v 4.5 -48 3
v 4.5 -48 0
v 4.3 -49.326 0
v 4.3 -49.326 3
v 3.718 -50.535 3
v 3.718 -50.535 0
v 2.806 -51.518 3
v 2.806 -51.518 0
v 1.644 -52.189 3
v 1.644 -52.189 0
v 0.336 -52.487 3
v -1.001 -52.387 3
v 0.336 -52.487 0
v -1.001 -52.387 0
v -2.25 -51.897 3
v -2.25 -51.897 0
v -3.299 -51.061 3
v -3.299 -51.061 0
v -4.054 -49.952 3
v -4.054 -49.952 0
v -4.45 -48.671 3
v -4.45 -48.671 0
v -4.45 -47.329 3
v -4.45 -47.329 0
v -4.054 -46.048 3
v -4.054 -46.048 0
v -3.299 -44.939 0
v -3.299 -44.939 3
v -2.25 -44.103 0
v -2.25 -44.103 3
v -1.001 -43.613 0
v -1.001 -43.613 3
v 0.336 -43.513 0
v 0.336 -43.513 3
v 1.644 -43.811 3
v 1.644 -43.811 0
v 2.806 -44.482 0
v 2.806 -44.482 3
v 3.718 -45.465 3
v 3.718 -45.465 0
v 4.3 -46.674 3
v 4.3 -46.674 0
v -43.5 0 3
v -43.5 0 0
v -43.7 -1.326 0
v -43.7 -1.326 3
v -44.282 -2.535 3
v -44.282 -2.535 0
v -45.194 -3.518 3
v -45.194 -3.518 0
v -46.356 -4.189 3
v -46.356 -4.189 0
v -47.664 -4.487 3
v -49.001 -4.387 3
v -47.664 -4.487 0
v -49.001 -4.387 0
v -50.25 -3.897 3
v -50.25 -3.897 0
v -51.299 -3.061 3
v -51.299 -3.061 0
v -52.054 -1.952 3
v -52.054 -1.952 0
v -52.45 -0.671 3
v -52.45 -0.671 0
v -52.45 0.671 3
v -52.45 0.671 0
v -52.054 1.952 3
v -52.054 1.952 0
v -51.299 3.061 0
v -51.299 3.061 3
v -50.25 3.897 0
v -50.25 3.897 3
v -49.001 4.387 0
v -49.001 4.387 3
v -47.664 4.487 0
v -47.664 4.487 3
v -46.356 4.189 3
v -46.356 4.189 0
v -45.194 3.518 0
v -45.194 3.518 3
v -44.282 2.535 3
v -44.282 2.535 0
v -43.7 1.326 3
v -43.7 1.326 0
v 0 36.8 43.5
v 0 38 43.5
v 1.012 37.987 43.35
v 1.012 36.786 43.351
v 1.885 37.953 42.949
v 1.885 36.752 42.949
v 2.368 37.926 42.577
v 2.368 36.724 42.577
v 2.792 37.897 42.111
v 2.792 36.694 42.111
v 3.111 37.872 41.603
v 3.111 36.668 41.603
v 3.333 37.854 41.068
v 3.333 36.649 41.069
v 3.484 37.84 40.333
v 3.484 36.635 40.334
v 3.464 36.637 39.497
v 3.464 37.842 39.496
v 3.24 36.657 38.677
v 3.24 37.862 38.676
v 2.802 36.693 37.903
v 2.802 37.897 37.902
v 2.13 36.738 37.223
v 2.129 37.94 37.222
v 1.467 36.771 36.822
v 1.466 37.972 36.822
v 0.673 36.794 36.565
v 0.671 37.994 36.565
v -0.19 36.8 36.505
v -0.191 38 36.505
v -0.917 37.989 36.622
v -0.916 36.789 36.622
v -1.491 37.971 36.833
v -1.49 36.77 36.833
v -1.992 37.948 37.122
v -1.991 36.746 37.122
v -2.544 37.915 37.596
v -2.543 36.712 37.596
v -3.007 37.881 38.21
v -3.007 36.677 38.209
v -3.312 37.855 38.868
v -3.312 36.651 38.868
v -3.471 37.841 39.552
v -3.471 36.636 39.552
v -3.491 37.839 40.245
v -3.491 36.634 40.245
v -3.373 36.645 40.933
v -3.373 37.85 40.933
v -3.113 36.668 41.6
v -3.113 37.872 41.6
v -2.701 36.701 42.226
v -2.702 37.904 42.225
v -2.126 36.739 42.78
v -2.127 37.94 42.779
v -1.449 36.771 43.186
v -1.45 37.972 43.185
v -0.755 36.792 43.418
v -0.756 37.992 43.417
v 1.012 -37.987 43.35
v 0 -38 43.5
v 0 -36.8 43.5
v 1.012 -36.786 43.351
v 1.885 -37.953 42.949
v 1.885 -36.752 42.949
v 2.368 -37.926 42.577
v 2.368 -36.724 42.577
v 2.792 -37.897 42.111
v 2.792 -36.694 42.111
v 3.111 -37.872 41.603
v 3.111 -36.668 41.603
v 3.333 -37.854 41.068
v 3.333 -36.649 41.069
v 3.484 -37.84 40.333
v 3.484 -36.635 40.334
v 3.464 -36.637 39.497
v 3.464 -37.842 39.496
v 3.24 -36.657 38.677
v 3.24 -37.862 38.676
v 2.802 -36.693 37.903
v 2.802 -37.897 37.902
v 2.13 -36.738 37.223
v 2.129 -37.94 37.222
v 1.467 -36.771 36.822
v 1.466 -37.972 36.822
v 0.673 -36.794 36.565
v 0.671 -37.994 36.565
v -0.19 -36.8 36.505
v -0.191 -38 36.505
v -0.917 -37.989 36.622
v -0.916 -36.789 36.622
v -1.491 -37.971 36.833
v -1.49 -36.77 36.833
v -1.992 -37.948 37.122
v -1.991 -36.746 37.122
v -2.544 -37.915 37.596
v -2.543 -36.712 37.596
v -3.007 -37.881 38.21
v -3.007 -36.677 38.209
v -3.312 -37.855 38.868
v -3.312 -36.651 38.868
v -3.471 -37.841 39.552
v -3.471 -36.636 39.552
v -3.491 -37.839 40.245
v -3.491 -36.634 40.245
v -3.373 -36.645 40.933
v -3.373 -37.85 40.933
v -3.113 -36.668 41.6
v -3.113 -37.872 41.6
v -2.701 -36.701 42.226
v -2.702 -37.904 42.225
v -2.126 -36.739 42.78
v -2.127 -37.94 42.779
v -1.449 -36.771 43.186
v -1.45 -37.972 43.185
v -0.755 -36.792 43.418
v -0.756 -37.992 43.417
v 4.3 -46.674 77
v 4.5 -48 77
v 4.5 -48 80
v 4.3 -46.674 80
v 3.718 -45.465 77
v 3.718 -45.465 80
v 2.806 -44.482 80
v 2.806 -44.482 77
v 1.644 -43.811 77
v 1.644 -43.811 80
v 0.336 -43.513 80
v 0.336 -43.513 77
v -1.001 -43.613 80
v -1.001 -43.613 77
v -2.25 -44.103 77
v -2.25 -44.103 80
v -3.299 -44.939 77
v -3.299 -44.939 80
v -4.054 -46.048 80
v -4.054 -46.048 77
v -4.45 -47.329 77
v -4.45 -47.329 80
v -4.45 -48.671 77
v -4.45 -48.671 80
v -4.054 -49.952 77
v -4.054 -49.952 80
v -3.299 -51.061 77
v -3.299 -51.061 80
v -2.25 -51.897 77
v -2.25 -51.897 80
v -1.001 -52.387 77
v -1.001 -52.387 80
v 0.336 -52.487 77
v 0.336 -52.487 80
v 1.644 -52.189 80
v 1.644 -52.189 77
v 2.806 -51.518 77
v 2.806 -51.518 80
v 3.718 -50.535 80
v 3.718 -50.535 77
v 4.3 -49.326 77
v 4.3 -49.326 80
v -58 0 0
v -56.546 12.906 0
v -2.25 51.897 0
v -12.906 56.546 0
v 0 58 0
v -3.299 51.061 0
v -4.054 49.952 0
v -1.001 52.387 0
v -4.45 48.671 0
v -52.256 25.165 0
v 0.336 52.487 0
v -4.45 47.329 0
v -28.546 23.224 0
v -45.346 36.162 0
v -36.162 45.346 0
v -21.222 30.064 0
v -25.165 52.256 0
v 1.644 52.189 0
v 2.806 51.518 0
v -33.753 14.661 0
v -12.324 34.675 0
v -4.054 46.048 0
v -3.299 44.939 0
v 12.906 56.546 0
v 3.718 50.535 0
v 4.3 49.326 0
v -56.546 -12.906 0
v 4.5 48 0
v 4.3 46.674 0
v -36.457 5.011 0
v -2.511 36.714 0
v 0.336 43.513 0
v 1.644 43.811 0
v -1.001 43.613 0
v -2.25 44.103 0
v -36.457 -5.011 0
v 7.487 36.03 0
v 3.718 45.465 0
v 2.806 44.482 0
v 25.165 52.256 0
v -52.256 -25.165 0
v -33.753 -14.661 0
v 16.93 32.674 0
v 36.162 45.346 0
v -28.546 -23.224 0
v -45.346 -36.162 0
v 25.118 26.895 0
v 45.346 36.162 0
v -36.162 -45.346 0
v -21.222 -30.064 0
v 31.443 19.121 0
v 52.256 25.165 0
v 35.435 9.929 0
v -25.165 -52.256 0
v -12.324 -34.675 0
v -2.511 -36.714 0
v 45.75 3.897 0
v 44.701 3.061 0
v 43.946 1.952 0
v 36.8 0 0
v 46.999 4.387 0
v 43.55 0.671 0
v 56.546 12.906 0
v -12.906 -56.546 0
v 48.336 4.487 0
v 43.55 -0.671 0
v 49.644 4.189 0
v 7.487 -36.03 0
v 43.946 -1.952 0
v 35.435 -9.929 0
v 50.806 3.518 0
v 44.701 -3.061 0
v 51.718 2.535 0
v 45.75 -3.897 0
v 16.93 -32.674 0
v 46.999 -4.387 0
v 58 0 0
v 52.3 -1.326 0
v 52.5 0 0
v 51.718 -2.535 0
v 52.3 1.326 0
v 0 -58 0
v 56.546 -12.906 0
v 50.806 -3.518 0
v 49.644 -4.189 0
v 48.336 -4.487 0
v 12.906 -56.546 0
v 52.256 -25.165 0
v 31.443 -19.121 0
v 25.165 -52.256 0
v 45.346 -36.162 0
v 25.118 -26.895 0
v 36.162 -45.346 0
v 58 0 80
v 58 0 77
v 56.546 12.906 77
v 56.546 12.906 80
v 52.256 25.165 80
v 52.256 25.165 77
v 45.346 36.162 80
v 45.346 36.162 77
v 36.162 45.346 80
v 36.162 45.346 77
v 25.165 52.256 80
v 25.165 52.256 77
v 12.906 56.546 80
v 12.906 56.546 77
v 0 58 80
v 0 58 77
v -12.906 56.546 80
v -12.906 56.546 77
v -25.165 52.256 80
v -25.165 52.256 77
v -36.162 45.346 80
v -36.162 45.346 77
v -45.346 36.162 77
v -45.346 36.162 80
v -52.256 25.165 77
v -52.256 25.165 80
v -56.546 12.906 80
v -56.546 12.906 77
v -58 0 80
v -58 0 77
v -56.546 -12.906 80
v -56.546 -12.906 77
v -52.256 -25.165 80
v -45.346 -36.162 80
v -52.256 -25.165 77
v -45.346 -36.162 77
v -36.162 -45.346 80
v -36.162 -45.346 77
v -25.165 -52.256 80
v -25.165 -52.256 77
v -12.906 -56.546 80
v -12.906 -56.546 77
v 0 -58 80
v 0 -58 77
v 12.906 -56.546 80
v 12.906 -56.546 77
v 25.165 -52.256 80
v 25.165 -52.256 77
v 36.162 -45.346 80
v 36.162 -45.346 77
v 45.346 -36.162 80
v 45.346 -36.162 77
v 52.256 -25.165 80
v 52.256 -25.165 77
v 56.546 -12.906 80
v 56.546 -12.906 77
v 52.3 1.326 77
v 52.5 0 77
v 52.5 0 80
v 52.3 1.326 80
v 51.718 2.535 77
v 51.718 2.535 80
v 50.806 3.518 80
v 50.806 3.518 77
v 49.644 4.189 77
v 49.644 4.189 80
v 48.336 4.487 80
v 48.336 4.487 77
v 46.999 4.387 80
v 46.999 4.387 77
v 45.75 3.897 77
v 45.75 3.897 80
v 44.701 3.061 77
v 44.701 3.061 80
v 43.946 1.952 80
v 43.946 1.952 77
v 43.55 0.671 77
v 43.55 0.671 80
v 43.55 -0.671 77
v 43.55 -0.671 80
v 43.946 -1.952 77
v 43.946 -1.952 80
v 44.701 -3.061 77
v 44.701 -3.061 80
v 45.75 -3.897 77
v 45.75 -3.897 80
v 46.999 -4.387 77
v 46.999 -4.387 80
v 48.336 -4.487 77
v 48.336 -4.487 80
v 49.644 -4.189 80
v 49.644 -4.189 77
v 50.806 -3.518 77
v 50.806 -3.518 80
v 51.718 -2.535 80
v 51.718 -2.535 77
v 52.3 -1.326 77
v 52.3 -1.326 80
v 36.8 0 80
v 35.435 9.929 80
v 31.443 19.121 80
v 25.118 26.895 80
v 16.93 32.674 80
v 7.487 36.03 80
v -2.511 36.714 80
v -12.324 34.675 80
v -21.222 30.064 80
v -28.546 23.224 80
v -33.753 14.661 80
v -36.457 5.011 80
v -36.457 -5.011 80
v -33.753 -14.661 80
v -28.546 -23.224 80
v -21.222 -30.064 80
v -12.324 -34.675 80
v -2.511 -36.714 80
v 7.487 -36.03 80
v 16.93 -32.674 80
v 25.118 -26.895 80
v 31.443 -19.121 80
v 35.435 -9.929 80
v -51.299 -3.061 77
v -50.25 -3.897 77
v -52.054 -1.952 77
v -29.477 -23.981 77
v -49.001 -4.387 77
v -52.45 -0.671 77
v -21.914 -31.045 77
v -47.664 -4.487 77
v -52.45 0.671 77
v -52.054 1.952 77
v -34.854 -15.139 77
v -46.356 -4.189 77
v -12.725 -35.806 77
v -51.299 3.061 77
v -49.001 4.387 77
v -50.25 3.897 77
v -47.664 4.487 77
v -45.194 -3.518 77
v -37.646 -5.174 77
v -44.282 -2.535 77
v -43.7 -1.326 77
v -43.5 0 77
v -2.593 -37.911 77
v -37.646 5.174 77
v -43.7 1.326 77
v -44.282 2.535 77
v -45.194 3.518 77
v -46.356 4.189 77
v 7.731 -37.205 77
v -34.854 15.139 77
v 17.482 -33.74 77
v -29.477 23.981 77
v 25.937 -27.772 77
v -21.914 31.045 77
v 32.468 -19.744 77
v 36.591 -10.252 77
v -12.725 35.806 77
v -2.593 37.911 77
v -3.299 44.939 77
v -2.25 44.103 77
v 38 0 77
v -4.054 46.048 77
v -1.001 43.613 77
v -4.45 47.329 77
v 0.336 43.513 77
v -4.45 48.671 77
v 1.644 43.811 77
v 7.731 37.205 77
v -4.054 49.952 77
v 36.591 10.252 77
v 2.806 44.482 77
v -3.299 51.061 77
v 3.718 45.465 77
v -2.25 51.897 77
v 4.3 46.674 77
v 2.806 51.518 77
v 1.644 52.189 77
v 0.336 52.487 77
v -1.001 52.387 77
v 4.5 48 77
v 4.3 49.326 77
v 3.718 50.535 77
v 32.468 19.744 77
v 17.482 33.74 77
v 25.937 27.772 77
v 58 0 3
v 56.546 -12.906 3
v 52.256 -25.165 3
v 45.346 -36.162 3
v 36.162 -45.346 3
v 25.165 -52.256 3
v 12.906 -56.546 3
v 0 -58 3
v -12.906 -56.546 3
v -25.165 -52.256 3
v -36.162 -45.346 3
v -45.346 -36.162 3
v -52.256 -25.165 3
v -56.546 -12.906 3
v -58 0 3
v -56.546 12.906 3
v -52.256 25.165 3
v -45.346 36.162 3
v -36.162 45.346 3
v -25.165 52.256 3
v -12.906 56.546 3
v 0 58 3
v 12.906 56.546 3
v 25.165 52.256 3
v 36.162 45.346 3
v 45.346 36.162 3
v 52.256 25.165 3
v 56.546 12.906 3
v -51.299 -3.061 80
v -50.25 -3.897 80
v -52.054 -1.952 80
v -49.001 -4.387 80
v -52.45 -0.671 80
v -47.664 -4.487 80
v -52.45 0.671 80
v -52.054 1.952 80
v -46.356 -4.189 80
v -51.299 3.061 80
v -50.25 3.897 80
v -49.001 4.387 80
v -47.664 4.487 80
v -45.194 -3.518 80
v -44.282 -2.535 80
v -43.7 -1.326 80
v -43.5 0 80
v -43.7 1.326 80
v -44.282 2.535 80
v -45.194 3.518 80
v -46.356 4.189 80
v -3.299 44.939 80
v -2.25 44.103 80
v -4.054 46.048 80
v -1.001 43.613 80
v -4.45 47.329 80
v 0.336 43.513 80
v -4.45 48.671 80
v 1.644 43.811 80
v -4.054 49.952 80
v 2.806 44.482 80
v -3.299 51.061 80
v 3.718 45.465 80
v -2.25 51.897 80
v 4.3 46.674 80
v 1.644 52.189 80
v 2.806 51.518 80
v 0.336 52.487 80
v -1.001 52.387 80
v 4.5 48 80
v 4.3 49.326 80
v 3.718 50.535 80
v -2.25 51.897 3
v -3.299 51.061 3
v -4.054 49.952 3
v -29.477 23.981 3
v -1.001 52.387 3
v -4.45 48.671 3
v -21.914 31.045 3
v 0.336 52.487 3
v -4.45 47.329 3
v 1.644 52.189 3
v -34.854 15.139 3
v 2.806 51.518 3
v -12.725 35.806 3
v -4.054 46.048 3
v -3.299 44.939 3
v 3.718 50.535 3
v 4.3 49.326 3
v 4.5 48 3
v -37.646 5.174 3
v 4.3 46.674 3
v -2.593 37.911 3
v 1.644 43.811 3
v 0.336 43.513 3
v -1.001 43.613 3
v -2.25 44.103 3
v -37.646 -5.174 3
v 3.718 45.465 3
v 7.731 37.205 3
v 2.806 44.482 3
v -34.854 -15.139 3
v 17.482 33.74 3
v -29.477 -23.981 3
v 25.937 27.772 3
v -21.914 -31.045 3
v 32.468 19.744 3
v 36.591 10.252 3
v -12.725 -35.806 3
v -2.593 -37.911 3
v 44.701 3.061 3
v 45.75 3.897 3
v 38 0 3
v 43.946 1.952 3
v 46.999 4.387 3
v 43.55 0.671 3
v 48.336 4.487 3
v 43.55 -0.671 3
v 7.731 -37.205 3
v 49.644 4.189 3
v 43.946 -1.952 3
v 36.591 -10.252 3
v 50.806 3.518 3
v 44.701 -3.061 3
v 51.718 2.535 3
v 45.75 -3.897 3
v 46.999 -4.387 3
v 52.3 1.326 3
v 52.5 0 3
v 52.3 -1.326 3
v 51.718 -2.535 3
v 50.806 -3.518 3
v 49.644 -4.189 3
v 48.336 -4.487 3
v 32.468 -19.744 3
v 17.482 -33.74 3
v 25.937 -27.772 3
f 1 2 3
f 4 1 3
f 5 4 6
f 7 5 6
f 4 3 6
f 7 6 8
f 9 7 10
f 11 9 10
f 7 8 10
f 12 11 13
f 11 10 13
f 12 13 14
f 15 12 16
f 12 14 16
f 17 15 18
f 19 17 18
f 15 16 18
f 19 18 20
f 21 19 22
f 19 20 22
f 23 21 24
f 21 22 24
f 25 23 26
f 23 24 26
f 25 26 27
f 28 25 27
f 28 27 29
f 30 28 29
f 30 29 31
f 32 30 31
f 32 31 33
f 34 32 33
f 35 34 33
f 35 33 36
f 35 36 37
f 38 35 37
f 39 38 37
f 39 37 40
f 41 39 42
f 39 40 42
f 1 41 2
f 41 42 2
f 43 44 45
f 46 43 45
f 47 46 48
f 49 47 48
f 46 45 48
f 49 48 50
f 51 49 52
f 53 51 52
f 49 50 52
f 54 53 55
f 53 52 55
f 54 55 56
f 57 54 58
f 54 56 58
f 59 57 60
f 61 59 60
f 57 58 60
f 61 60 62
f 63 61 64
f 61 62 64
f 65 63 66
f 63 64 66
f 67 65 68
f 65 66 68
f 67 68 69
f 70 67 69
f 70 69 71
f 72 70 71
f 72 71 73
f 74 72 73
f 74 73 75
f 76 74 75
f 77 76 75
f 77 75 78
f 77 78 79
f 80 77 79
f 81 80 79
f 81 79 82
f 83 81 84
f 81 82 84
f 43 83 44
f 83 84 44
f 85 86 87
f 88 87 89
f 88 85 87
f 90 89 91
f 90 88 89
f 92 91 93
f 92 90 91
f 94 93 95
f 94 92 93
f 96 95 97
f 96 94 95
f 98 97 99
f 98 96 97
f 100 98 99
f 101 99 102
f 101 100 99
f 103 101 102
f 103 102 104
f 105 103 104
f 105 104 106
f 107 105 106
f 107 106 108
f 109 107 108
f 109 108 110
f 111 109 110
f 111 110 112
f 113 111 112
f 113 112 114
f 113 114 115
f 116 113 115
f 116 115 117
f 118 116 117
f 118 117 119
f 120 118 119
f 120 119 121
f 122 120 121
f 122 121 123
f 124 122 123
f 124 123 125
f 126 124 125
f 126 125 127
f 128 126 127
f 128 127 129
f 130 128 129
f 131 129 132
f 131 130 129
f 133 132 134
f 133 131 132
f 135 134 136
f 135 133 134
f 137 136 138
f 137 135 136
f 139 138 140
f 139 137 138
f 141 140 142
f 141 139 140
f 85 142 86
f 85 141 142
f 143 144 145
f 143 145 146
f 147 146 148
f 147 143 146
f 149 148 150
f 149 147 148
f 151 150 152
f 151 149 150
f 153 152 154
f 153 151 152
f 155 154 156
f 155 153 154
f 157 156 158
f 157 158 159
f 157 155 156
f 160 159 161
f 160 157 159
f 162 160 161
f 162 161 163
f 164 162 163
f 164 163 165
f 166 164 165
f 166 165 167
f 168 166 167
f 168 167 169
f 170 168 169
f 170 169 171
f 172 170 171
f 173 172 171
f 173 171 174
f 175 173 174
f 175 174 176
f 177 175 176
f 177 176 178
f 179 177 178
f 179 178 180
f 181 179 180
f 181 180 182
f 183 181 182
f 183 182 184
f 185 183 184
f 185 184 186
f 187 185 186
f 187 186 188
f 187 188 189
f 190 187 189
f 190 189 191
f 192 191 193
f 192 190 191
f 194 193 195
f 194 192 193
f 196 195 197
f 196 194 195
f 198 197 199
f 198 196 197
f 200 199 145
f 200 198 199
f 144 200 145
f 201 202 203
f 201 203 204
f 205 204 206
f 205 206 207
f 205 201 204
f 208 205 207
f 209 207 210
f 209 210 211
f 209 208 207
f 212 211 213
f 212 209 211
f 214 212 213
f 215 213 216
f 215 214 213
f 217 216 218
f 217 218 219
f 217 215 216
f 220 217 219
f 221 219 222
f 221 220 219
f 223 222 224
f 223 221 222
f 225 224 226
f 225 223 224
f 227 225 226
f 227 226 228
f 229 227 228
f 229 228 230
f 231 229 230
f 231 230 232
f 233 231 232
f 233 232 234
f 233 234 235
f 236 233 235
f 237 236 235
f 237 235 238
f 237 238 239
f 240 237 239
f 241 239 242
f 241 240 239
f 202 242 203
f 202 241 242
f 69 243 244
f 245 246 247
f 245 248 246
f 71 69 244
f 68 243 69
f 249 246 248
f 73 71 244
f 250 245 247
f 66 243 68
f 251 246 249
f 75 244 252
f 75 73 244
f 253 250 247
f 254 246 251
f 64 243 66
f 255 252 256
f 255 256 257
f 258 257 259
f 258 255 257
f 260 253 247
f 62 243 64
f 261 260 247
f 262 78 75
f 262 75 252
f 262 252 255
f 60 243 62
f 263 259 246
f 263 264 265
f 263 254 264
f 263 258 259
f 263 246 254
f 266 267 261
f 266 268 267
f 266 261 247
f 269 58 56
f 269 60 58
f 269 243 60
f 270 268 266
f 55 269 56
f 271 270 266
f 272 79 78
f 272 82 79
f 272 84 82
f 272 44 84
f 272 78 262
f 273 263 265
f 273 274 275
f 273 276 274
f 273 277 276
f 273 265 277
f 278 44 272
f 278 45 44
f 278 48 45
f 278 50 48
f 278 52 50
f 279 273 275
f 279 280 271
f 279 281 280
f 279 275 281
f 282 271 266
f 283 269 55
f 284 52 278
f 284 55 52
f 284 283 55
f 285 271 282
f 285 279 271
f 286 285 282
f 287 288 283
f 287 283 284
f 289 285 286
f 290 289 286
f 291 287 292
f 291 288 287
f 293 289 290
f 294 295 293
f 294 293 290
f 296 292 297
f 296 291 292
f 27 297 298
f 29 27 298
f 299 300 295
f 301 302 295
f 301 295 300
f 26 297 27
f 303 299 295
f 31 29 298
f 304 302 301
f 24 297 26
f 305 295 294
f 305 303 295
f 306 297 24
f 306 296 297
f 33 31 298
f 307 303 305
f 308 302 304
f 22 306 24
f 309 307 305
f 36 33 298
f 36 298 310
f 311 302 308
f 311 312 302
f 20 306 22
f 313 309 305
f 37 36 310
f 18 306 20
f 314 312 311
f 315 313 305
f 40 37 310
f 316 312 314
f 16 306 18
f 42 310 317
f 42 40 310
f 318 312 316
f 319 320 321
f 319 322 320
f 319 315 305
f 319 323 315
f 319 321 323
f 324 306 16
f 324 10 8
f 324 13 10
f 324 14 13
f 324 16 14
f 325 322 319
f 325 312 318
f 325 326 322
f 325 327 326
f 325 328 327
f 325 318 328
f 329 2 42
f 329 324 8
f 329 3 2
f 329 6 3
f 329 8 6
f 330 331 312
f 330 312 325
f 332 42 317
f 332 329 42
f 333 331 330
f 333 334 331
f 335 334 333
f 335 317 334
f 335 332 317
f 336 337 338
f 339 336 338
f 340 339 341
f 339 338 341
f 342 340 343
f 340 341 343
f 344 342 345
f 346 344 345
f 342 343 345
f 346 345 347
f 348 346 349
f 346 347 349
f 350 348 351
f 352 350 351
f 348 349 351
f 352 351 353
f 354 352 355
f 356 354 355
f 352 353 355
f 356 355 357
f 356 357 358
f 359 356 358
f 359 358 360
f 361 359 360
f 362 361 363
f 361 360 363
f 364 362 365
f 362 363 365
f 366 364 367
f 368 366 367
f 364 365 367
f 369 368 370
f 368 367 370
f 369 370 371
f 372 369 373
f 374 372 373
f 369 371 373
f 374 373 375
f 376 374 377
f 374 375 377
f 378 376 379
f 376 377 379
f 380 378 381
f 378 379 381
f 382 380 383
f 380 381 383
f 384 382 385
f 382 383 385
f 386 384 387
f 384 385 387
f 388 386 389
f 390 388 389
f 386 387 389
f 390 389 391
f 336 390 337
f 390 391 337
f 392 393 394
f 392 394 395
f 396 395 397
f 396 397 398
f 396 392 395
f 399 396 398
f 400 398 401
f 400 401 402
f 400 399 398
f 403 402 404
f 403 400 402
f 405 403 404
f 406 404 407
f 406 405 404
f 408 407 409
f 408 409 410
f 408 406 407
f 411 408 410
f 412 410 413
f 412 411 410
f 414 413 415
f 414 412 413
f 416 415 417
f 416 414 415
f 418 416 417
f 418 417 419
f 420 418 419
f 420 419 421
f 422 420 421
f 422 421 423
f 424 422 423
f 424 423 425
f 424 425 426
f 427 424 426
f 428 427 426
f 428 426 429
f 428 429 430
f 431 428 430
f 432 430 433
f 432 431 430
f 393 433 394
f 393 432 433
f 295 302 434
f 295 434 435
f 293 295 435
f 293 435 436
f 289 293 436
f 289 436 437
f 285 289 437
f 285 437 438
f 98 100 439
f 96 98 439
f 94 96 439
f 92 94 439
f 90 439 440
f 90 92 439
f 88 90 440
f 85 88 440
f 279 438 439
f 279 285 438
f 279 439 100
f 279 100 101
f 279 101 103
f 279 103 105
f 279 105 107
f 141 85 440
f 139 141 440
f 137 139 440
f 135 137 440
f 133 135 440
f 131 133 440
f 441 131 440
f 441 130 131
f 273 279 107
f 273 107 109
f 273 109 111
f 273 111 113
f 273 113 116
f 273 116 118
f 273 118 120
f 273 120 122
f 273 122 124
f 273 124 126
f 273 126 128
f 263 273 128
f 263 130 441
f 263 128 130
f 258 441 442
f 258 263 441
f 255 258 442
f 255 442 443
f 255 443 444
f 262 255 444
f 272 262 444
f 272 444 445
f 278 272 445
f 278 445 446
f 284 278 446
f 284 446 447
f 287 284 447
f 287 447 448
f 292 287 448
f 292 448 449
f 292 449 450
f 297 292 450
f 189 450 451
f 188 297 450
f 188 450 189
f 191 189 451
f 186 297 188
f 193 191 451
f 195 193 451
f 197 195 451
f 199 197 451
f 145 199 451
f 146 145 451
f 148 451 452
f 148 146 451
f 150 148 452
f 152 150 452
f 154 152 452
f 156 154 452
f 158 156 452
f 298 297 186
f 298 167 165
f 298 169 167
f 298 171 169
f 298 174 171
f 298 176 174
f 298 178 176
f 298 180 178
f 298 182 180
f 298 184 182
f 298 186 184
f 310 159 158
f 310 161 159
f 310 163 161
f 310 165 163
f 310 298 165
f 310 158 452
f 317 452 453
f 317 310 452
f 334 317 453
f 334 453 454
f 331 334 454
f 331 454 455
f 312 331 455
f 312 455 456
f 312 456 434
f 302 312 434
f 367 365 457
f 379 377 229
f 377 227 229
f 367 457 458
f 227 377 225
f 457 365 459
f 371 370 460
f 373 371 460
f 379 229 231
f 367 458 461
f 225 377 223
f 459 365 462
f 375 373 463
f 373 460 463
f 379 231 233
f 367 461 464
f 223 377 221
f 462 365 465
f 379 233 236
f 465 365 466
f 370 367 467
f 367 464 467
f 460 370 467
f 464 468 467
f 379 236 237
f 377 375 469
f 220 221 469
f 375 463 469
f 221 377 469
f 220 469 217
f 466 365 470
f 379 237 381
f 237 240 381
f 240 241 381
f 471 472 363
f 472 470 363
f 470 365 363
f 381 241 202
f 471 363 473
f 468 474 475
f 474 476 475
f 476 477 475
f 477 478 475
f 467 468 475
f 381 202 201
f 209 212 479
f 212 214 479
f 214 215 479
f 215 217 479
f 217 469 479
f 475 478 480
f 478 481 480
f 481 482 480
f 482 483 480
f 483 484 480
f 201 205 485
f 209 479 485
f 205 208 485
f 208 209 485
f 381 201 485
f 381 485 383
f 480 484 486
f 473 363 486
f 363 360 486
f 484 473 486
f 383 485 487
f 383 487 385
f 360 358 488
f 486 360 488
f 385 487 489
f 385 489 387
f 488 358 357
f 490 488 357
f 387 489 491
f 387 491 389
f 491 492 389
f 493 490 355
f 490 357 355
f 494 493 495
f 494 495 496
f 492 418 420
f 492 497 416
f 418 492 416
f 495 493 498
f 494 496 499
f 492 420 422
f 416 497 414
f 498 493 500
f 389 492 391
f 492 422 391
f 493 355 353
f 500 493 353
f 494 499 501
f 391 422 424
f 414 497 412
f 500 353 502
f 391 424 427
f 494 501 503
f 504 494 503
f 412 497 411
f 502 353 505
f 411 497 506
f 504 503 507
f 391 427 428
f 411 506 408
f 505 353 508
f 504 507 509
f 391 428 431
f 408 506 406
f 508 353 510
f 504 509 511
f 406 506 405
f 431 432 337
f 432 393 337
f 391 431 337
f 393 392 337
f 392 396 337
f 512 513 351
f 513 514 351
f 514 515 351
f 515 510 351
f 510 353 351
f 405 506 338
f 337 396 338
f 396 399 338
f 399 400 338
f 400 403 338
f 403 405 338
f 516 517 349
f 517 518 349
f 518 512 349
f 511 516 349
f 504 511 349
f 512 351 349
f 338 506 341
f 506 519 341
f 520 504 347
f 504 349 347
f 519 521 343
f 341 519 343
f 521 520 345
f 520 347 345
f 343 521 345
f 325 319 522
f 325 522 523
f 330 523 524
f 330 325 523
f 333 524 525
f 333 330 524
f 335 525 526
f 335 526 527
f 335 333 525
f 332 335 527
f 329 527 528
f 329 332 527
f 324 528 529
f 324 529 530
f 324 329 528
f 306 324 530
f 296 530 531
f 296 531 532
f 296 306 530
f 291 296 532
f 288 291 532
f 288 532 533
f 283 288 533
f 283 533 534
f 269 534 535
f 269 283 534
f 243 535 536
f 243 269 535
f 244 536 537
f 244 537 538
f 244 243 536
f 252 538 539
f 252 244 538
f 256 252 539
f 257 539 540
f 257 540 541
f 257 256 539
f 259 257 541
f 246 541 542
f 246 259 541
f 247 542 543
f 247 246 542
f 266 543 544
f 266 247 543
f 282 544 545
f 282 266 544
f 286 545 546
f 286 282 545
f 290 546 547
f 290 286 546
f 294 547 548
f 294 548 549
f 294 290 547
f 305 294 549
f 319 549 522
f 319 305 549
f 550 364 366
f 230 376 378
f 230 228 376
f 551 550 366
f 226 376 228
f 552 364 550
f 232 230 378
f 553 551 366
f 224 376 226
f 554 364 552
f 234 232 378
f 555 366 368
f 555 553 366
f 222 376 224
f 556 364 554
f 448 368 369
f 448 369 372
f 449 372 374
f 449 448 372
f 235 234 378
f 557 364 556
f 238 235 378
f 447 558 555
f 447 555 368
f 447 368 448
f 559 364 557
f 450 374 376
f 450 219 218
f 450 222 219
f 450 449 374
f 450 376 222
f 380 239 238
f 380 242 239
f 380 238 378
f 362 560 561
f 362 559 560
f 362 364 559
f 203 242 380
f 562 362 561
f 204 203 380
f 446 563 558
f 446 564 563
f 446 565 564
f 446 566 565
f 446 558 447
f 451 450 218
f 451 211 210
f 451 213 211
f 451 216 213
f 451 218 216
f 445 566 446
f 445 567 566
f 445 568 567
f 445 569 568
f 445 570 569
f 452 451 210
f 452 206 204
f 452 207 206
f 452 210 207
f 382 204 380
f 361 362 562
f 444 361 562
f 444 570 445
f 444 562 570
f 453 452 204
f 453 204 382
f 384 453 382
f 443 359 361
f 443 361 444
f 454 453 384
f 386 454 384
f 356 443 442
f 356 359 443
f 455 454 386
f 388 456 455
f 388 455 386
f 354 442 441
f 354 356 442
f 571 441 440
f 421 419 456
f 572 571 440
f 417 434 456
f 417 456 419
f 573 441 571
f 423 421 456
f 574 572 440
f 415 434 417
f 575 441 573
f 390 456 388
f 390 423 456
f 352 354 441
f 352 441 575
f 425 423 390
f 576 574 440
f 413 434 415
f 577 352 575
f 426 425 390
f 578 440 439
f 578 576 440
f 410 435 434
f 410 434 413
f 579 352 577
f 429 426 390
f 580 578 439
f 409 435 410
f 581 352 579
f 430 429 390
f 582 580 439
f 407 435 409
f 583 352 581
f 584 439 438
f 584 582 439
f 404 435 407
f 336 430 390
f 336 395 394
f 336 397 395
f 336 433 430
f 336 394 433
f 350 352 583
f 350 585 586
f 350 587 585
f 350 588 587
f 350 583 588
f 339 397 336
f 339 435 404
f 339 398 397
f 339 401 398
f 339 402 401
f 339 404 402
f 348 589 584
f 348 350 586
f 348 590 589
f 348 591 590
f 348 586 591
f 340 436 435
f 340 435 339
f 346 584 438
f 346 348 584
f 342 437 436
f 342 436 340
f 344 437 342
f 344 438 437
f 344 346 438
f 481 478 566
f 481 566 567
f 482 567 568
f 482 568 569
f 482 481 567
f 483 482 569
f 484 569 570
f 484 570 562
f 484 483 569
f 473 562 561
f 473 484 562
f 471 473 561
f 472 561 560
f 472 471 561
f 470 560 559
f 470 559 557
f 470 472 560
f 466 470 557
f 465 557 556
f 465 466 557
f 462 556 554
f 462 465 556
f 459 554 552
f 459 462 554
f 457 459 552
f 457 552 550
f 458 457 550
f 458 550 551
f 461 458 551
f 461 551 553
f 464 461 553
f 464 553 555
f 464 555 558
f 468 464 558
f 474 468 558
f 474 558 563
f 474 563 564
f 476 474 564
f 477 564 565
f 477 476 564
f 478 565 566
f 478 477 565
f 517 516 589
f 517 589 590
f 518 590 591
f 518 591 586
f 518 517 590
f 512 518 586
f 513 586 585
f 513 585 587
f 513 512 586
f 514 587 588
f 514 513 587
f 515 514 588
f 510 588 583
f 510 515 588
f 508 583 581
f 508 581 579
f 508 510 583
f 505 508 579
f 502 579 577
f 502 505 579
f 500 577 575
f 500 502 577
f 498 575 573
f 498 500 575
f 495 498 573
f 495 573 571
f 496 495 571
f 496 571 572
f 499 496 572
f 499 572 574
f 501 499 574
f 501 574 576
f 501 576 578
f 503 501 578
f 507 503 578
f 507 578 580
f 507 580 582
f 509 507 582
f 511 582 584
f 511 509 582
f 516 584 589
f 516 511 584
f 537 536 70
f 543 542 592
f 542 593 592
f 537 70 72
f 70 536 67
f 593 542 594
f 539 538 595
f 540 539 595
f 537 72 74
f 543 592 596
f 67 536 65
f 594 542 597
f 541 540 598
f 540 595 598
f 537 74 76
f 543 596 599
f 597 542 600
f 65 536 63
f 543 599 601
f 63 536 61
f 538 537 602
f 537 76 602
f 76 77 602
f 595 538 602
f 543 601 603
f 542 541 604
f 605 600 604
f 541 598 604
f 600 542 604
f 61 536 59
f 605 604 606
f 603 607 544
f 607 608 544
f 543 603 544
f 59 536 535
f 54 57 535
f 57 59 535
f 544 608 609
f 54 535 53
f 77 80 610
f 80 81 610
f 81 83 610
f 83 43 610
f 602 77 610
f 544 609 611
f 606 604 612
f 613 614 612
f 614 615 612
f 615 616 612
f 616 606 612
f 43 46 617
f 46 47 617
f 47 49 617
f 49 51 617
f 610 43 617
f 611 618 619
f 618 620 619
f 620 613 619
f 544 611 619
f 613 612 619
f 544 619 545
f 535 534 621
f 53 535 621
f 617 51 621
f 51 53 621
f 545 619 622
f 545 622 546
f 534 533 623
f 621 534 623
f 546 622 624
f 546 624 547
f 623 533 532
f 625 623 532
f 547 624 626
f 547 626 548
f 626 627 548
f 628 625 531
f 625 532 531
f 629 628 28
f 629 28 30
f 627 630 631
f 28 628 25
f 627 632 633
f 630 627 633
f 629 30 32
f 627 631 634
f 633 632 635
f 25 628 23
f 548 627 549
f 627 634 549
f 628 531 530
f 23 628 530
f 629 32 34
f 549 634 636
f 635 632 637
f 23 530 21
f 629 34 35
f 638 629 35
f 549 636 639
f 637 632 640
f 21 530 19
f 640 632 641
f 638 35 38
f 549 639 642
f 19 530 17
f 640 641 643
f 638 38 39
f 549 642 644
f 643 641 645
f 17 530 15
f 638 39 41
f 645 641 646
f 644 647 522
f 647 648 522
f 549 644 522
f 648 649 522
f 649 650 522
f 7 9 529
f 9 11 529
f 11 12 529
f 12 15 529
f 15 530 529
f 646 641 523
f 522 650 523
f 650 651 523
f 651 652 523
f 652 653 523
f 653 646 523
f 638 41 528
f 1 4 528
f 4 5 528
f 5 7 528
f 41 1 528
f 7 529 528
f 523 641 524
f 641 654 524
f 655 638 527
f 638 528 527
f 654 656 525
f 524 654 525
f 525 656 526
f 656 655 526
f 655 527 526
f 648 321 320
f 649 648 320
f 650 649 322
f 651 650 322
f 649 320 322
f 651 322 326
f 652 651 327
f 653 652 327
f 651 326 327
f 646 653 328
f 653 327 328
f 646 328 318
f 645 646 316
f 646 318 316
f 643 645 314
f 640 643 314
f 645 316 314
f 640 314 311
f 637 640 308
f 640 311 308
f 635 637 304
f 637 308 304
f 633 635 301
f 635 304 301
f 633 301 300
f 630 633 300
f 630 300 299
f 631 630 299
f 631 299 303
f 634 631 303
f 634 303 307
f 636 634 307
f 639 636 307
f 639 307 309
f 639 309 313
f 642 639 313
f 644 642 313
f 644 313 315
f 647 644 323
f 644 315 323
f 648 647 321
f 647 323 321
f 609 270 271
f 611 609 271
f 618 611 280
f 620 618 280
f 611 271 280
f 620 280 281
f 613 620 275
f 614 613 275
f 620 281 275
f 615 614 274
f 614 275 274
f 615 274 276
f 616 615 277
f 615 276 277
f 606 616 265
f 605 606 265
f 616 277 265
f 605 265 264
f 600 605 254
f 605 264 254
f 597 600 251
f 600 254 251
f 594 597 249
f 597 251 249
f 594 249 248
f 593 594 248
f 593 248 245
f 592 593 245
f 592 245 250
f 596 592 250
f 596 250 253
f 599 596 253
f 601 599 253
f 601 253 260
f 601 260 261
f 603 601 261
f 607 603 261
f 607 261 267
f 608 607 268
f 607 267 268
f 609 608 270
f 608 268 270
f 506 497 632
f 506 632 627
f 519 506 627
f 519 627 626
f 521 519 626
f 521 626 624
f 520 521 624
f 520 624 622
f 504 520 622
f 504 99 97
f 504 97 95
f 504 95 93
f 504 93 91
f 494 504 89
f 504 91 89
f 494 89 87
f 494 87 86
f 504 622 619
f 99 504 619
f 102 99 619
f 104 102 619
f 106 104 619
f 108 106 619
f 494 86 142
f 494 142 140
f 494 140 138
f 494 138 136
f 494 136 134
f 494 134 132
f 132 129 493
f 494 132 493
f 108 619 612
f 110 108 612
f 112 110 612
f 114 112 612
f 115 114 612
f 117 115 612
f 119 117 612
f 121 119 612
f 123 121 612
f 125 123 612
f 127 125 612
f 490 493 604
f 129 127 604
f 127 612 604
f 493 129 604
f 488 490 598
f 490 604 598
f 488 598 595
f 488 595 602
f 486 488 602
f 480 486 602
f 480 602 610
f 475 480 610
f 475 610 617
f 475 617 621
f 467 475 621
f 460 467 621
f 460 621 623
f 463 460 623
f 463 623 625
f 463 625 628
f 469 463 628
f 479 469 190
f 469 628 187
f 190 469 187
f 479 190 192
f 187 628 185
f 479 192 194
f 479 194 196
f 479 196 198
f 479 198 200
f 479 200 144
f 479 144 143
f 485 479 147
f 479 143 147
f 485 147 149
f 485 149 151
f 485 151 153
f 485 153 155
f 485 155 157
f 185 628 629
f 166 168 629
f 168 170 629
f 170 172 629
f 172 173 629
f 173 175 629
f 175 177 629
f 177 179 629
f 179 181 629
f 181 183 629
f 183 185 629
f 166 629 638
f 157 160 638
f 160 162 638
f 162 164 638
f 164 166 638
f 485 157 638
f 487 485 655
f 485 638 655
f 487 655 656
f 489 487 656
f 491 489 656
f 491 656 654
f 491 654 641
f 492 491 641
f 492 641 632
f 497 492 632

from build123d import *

# Parameters (mm, degrees)
SKETCH1_R               = 38
SKETCH1_R_2             = 36.8
BOSS_EXTRUDE1_DEPTH     = 80
CUT_EXTRUDE1_DEPTH      = 97.374270425
CUT_EXTRUDE1_DEPTH_BACK = 97.374270425
SKETCH2_R               = 3.5
BOSS_EXTRUDE2_START     = -3
SKETCH3_R               = 58
SKETCH3_R_2             = 38
SKETCH3_R_3             = 4.5
BOSS_EXTRUDE2_DEPTH     = 3
SKETCH4_R               = 58
SKETCH4_R_2             = 38
SKETCH4_R_3             = 4.5
BOSS_EXTRUDE3_DEPTH     = 3


with BuildPart() as part:
    # Sketch1 → Boss-Extrude1 (new body)
    with BuildSketch(Plane.XY):
        Circle(SKETCH1_R)
        Circle(SKETCH1_R_2, mode=Mode.SUBTRACT)
    extrude(amount=BOSS_EXTRUDE1_DEPTH)

    # Sketch2 → Cut-Extrude1 (cut, two sides: drawn at the far end of the back side and taken through both)
    with BuildSketch(Plane(origin=(0, 0, 0), x_dir=(1, 0, 0), z_dir=(0, 1, 0)).offset(-CUT_EXTRUDE1_DEPTH_BACK)):
        with Locations(Location((0, -40, 0), (0, 0, 270))):
            Circle(SKETCH2_R)
    extrude(amount=CUT_EXTRUDE1_DEPTH + CUT_EXTRUDE1_DEPTH_BACK, mode=Mode.SUBTRACT)

    # Sketch3 → Boss-Extrude2 (add)
    with BuildSketch(Plane.XY.offset(80).offset(BOSS_EXTRUDE2_START)):
        Circle(SKETCH3_R)
        Circle(SKETCH3_R_2, mode=Mode.SUBTRACT)
        with Locations((-48, 0)):
            Circle(SKETCH3_R_3, mode=Mode.SUBTRACT)
        with Locations((0, 48)):
            Circle(SKETCH3_R_3, mode=Mode.SUBTRACT)
        with Locations((48, 0)):
            Circle(SKETCH3_R_3, mode=Mode.SUBTRACT)
        with Locations((0, -48)):
            Circle(SKETCH3_R_3, mode=Mode.SUBTRACT)
    extrude(amount=BOSS_EXTRUDE2_DEPTH)

    # Sketch4 → Boss-Extrude3 (add)
    with BuildSketch(Plane(origin=(0, 0, 0), x_dir=(-1, 0, 0), z_dir=(0, 0, -1))):
        with Locations(Location((0, 0, 0), (0, 0, 180))):
            Circle(SKETCH4_R)
        Circle(SKETCH4_R_2, mode=Mode.SUBTRACT)
        with Locations(Location((48, 0, 0), (0, 0, 180))):
            Circle(SKETCH4_R_3, mode=Mode.SUBTRACT)
        with Locations(Location((0, -48, 0), (0, 0, 180))):
            Circle(SKETCH4_R_3, mode=Mode.SUBTRACT)
        with Locations(Location((-48, 0, 0), (0, 0, 180))):
            Circle(SKETCH4_R_3, mode=Mode.SUBTRACT)
        with Locations(Location((0, 48, 0), (0, 0, 180))):
            Circle(SKETCH4_R_3, mode=Mode.SUBTRACT)
    extrude(amount=-BOSS_EXTRUDE3_DEPTH)


solid = part.part
